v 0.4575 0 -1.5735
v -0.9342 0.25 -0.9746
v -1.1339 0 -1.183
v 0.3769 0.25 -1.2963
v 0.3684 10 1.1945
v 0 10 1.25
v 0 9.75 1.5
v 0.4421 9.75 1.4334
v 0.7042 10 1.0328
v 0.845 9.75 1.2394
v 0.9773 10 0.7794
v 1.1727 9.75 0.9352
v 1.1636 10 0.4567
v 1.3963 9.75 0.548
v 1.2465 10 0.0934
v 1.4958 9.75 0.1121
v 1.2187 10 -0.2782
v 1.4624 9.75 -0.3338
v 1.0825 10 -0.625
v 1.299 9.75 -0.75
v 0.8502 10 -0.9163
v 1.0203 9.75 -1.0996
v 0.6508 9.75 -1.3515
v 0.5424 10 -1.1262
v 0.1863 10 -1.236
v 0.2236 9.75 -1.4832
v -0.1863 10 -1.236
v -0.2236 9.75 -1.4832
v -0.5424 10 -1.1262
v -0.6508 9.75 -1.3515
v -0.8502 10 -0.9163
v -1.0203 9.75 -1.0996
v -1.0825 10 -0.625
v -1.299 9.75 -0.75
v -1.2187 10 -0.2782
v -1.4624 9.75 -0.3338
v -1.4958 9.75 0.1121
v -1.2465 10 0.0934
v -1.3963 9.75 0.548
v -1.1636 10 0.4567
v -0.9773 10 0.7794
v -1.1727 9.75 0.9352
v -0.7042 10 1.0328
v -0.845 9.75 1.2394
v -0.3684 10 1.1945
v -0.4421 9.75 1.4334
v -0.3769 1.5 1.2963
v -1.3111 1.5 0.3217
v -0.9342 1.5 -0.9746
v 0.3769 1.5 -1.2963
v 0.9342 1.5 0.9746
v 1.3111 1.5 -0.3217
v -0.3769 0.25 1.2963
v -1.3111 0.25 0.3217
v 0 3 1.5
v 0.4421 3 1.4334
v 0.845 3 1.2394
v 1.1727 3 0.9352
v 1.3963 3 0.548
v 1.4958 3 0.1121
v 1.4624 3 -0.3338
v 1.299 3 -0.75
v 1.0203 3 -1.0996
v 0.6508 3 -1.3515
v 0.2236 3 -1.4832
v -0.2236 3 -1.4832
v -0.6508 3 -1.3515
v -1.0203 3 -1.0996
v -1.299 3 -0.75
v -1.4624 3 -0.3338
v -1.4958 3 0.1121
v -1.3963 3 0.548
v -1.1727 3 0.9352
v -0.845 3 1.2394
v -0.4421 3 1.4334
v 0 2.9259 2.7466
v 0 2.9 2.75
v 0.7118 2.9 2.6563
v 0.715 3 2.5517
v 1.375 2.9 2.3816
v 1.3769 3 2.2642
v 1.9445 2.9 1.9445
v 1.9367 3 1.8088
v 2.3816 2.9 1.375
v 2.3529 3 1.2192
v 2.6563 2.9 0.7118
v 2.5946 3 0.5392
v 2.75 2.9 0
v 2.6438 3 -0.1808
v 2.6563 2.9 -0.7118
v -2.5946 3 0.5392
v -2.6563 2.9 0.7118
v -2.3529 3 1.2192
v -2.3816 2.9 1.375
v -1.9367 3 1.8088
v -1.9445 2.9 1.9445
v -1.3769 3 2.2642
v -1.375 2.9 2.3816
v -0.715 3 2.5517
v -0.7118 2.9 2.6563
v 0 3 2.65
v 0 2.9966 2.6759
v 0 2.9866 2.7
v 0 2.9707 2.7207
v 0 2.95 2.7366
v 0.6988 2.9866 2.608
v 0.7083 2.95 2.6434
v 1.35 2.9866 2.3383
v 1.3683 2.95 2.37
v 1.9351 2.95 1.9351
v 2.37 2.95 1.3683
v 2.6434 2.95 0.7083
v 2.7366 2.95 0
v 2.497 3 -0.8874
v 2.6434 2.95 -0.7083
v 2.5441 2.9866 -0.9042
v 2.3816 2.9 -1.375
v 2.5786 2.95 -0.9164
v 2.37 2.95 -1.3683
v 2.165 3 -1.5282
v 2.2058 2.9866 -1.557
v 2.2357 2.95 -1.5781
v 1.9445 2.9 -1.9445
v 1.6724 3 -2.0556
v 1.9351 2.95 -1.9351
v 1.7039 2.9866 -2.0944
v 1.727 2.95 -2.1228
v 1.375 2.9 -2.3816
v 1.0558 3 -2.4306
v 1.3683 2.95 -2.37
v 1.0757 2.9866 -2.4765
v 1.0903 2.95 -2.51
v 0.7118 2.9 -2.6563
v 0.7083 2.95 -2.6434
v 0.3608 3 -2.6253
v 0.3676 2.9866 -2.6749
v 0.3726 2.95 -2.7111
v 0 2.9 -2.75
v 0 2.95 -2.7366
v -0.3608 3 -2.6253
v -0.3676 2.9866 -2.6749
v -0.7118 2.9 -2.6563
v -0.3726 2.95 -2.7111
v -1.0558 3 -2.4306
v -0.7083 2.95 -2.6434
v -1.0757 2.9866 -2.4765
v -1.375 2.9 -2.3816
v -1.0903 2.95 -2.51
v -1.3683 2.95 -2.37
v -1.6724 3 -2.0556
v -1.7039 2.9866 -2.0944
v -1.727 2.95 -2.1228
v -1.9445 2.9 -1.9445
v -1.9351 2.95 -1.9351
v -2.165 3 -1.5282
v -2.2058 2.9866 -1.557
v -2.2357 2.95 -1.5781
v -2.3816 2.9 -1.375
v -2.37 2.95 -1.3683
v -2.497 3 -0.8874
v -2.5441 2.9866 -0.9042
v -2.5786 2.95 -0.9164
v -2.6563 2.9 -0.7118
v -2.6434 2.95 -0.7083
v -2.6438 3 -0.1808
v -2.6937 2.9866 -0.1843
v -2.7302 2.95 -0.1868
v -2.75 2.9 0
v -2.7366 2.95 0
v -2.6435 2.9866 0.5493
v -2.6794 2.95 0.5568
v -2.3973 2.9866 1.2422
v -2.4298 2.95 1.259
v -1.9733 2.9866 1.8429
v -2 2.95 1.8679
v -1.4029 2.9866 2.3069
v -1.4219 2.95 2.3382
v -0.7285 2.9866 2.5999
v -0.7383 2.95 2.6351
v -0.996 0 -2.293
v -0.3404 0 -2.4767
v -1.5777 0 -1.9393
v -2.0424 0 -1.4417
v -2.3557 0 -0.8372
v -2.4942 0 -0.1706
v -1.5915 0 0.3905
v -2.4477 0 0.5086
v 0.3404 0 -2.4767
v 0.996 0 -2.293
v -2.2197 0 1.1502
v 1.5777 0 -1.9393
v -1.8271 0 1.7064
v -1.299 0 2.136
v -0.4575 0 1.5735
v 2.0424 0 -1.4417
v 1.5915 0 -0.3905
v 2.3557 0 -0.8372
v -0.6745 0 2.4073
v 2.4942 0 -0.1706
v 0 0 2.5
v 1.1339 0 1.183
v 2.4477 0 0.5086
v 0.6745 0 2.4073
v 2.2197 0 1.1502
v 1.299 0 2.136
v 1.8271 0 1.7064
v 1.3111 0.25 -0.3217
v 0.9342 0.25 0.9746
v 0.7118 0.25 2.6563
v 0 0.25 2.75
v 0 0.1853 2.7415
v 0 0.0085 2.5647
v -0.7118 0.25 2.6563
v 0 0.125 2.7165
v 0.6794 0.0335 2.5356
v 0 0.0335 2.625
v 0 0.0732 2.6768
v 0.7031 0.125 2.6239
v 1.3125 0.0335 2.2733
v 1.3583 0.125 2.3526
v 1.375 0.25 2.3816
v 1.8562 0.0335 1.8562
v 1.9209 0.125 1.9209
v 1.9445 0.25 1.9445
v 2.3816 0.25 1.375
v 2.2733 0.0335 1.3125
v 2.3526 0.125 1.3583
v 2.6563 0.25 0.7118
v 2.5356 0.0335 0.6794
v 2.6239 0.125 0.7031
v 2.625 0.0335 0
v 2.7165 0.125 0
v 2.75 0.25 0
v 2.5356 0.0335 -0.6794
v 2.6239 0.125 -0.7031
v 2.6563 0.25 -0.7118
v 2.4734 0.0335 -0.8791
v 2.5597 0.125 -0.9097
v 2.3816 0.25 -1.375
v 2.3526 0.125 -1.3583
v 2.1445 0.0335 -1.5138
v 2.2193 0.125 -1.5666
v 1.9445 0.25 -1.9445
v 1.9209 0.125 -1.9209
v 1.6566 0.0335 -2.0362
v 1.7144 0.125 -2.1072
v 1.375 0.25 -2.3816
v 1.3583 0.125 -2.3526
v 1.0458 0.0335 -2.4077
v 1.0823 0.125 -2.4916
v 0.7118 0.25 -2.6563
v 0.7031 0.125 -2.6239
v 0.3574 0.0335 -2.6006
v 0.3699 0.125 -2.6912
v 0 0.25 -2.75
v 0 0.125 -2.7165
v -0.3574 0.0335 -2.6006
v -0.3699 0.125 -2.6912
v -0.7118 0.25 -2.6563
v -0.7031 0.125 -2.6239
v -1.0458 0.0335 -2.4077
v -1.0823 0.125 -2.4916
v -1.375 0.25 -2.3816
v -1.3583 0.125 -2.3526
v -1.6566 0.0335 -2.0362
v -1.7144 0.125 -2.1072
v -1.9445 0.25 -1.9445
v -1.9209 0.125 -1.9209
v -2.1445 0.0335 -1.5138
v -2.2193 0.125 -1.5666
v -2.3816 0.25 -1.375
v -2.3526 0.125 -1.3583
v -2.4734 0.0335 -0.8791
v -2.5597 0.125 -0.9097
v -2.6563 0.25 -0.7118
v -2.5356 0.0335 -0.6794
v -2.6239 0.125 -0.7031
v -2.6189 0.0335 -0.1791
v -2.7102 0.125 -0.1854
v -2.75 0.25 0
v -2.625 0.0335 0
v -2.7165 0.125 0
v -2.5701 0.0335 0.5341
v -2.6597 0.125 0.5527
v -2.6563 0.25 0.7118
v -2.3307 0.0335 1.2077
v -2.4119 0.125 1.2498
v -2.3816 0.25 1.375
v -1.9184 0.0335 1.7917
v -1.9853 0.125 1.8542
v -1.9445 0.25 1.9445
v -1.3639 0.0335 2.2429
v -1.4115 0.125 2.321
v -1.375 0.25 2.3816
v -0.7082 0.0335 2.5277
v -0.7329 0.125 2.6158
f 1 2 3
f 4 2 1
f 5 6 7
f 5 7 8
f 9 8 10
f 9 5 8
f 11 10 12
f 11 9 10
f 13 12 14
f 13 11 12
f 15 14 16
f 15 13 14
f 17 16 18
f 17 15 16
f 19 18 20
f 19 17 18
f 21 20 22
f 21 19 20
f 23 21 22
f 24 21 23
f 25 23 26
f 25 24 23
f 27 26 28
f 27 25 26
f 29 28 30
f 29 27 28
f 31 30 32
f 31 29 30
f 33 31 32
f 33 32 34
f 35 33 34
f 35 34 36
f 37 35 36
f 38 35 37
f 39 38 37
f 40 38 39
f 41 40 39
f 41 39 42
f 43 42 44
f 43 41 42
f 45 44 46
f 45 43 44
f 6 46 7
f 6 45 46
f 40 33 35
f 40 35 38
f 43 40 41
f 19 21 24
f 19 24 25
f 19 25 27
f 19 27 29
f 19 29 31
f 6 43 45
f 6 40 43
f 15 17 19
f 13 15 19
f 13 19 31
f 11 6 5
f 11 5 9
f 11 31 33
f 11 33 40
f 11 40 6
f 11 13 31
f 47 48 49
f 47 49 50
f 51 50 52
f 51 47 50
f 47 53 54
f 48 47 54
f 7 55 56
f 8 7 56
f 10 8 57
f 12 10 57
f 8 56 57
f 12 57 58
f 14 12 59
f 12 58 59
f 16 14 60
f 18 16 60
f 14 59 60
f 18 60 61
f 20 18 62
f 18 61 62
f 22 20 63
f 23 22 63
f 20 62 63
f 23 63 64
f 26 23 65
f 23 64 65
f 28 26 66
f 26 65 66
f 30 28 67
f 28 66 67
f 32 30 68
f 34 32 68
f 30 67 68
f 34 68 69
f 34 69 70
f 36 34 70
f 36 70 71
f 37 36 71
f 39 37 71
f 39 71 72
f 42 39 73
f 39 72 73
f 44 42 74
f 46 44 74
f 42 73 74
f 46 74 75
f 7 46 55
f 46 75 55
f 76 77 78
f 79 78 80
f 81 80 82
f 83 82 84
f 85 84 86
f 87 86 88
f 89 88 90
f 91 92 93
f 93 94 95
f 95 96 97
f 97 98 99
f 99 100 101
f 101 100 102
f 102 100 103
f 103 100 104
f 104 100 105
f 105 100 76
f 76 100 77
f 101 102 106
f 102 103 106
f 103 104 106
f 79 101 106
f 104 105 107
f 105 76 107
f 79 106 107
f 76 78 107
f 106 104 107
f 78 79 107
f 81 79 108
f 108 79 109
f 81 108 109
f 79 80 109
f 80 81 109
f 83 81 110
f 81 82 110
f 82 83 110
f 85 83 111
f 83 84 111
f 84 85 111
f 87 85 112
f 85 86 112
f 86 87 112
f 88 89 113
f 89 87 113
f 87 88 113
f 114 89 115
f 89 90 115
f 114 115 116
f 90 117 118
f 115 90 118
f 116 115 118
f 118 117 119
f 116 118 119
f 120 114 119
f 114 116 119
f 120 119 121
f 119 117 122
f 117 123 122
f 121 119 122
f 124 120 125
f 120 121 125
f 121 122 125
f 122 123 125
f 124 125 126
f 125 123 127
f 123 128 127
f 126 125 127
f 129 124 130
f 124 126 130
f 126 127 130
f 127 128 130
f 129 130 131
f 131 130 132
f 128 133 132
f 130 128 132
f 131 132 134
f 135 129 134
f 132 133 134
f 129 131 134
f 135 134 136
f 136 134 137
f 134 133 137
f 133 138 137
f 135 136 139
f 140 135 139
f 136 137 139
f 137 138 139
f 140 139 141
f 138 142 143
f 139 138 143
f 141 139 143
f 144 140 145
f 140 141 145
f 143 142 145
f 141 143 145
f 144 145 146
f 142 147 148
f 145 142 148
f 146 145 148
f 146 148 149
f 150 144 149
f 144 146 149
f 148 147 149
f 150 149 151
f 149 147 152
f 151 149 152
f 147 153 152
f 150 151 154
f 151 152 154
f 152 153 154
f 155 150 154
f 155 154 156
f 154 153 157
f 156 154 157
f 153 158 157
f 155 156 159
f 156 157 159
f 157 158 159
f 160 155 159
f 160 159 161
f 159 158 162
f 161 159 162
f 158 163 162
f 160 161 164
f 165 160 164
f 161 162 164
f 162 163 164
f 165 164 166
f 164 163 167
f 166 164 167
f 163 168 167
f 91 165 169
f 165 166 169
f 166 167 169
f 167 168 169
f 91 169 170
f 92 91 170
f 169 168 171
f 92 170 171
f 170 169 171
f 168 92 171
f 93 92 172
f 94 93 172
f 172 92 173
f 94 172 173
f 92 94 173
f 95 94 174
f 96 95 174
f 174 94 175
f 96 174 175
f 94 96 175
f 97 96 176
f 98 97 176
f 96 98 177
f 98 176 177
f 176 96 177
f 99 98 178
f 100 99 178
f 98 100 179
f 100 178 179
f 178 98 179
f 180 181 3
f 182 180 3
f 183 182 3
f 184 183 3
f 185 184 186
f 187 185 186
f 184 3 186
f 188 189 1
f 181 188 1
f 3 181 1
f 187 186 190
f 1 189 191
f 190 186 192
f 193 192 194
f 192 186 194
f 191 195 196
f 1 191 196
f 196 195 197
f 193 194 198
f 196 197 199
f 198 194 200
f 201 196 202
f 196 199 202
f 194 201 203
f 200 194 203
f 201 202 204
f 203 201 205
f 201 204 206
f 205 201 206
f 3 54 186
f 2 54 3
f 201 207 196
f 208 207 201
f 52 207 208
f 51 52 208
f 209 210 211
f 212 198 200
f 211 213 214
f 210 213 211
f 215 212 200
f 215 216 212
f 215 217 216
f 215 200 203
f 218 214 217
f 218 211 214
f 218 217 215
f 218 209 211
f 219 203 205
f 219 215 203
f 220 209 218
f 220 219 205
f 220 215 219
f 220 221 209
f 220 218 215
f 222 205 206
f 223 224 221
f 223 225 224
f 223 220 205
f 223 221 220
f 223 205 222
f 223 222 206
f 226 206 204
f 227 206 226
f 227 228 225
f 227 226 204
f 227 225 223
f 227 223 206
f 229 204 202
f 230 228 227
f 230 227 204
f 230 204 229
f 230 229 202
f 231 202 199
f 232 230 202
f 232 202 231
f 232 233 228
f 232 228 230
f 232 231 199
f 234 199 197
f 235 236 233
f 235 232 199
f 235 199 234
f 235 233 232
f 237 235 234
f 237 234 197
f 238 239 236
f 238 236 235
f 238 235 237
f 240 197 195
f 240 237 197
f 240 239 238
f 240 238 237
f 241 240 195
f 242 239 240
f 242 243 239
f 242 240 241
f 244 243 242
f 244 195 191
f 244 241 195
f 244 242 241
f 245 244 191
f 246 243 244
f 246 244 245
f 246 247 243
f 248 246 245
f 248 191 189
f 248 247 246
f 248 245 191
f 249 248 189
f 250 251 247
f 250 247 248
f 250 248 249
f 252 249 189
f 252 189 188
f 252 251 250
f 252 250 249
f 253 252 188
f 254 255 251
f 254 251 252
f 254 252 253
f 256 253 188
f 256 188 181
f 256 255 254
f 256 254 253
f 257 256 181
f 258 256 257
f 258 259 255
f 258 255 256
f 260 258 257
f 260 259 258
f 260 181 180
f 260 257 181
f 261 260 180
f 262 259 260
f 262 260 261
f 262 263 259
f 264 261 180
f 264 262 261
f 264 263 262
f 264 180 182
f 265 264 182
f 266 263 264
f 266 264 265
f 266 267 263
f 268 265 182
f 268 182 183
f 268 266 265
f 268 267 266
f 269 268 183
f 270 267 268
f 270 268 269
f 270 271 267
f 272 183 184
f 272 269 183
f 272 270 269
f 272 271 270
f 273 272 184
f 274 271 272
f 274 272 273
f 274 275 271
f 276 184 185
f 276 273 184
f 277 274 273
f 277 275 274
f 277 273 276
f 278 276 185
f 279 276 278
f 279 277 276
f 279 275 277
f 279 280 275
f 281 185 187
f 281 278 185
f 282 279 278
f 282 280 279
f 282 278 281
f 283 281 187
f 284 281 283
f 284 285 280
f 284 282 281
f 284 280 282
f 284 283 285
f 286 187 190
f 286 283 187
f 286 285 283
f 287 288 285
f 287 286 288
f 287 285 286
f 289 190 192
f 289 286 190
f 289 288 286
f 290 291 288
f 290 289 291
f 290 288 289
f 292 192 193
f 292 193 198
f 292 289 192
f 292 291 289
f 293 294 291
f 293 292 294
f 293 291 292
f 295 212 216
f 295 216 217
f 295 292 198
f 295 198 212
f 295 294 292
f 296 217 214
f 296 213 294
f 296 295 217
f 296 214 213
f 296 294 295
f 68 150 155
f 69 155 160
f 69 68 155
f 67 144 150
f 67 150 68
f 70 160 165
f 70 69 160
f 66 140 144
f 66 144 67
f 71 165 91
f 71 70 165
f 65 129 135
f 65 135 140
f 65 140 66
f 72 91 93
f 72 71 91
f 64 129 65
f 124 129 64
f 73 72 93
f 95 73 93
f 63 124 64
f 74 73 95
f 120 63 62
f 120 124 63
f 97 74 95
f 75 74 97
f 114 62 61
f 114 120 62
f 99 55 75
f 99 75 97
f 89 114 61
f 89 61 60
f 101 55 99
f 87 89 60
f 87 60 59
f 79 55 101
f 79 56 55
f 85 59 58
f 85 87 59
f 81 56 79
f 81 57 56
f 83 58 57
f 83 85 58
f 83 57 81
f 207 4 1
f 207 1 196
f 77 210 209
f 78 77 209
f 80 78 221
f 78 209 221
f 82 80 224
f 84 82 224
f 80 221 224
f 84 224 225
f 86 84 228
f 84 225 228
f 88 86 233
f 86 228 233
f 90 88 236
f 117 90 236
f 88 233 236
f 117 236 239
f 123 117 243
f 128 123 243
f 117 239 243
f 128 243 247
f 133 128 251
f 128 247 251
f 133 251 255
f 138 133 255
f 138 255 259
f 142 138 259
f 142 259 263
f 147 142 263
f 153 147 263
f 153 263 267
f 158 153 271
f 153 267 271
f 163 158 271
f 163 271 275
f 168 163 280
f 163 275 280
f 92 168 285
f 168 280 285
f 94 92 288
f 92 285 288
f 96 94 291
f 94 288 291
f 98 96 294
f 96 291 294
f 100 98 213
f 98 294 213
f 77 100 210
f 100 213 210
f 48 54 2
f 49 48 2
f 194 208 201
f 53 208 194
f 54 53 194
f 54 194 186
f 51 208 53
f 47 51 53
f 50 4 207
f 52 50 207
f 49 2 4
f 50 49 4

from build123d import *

# Parameters (mm, degrees)
SKETCH1_R           = 2.75
BOSS_EXTRUDE1_DEPTH = 3
SKETCH2_R           = 1.5
BOSS_EXTRUDE2_DEPTH = 7
CUT_EXTRUDE1_DEPTH  = 1.5
CHAMFER1_SIZE       = 0.25
FILLET1_R           = 0.25
CHAMFER2_SIZE       = 0.25
FILLET2_R           = 0.1


with BuildPart() as part:
    # Sketch1 → Boss-Extrude1 (new body)
    with BuildSketch(Plane(origin=(0, 0, 0), x_dir=(1, 0, 0), z_dir=(0, 1, 0))):
        with Locations(Location((0, 0, 0), (0, 0, 270))):
            Circle(SKETCH1_R)
    extrude(amount=BOSS_EXTRUDE1_DEPTH)

    # Sketch2 → Boss-Extrude2 (add)
    with BuildSketch(Plane(origin=(0, 3, 0), x_dir=(1, 0, 0), z_dir=(0, 1, 0))):
        with Locations(Location((0, 0, 0), (0, 0, 270))):
            Circle(SKETCH2_R)
    extrude(amount=BOSS_EXTRUDE2_DEPTH)

    # Sketch3 → Cut-Extrude1 (cut)
    with BuildSketch(Plane.XZ):
        Polygon((0.934168857, 0.974591477), (-0.376936549, 1.2963097), (-1.311105406, 0.321718223), (-0.934168857, -0.974591477), (0.376936549, -1.2963097), (1.311105406, -0.321718223), align=None)
    extrude(amount=-CUT_EXTRUDE1_DEPTH, mode=Mode.SUBTRACT)

    # Chamfer1
    chamfer1_edges = [part.edges().sort_by_distance(p)[0] for p in [
        (1.122637131, 0, 0.326436627),
        (0.278616154, 0, 1.135450588),
        (-0.844020977, 0, 0.809013962),
        (-1.122637131, 0, -0.326436627),
        (-0.278616154, 0, -1.135450588),
        (0.844020977, 0, -0.809013962),
    ]]
    chamfer(chamfer1_edges, length=CHAMFER1_SIZE)

    # Fillet1
    fillet1_edges = [part.edges().sort_by_distance(p)[0] for p in [
        (0, 0, -2.75),
    ]]
    fillet(fillet1_edges, radius=FILLET1_R)

    # Chamfer2
    chamfer2_edges = [part.edges().sort_by_distance(p)[0] for p in [
        (0, 10, -1.5),
    ]]
    chamfer(chamfer2_edges, length=CHAMFER2_SIZE)

    # Fillet2
    fillet2_edges = [part.edges().sort_by_distance(p)[0] for p in [
        (0, 3, -2.75),
    ]]
    fillet(fillet2_edges, radius=FILLET2_R)


solid = part.part
